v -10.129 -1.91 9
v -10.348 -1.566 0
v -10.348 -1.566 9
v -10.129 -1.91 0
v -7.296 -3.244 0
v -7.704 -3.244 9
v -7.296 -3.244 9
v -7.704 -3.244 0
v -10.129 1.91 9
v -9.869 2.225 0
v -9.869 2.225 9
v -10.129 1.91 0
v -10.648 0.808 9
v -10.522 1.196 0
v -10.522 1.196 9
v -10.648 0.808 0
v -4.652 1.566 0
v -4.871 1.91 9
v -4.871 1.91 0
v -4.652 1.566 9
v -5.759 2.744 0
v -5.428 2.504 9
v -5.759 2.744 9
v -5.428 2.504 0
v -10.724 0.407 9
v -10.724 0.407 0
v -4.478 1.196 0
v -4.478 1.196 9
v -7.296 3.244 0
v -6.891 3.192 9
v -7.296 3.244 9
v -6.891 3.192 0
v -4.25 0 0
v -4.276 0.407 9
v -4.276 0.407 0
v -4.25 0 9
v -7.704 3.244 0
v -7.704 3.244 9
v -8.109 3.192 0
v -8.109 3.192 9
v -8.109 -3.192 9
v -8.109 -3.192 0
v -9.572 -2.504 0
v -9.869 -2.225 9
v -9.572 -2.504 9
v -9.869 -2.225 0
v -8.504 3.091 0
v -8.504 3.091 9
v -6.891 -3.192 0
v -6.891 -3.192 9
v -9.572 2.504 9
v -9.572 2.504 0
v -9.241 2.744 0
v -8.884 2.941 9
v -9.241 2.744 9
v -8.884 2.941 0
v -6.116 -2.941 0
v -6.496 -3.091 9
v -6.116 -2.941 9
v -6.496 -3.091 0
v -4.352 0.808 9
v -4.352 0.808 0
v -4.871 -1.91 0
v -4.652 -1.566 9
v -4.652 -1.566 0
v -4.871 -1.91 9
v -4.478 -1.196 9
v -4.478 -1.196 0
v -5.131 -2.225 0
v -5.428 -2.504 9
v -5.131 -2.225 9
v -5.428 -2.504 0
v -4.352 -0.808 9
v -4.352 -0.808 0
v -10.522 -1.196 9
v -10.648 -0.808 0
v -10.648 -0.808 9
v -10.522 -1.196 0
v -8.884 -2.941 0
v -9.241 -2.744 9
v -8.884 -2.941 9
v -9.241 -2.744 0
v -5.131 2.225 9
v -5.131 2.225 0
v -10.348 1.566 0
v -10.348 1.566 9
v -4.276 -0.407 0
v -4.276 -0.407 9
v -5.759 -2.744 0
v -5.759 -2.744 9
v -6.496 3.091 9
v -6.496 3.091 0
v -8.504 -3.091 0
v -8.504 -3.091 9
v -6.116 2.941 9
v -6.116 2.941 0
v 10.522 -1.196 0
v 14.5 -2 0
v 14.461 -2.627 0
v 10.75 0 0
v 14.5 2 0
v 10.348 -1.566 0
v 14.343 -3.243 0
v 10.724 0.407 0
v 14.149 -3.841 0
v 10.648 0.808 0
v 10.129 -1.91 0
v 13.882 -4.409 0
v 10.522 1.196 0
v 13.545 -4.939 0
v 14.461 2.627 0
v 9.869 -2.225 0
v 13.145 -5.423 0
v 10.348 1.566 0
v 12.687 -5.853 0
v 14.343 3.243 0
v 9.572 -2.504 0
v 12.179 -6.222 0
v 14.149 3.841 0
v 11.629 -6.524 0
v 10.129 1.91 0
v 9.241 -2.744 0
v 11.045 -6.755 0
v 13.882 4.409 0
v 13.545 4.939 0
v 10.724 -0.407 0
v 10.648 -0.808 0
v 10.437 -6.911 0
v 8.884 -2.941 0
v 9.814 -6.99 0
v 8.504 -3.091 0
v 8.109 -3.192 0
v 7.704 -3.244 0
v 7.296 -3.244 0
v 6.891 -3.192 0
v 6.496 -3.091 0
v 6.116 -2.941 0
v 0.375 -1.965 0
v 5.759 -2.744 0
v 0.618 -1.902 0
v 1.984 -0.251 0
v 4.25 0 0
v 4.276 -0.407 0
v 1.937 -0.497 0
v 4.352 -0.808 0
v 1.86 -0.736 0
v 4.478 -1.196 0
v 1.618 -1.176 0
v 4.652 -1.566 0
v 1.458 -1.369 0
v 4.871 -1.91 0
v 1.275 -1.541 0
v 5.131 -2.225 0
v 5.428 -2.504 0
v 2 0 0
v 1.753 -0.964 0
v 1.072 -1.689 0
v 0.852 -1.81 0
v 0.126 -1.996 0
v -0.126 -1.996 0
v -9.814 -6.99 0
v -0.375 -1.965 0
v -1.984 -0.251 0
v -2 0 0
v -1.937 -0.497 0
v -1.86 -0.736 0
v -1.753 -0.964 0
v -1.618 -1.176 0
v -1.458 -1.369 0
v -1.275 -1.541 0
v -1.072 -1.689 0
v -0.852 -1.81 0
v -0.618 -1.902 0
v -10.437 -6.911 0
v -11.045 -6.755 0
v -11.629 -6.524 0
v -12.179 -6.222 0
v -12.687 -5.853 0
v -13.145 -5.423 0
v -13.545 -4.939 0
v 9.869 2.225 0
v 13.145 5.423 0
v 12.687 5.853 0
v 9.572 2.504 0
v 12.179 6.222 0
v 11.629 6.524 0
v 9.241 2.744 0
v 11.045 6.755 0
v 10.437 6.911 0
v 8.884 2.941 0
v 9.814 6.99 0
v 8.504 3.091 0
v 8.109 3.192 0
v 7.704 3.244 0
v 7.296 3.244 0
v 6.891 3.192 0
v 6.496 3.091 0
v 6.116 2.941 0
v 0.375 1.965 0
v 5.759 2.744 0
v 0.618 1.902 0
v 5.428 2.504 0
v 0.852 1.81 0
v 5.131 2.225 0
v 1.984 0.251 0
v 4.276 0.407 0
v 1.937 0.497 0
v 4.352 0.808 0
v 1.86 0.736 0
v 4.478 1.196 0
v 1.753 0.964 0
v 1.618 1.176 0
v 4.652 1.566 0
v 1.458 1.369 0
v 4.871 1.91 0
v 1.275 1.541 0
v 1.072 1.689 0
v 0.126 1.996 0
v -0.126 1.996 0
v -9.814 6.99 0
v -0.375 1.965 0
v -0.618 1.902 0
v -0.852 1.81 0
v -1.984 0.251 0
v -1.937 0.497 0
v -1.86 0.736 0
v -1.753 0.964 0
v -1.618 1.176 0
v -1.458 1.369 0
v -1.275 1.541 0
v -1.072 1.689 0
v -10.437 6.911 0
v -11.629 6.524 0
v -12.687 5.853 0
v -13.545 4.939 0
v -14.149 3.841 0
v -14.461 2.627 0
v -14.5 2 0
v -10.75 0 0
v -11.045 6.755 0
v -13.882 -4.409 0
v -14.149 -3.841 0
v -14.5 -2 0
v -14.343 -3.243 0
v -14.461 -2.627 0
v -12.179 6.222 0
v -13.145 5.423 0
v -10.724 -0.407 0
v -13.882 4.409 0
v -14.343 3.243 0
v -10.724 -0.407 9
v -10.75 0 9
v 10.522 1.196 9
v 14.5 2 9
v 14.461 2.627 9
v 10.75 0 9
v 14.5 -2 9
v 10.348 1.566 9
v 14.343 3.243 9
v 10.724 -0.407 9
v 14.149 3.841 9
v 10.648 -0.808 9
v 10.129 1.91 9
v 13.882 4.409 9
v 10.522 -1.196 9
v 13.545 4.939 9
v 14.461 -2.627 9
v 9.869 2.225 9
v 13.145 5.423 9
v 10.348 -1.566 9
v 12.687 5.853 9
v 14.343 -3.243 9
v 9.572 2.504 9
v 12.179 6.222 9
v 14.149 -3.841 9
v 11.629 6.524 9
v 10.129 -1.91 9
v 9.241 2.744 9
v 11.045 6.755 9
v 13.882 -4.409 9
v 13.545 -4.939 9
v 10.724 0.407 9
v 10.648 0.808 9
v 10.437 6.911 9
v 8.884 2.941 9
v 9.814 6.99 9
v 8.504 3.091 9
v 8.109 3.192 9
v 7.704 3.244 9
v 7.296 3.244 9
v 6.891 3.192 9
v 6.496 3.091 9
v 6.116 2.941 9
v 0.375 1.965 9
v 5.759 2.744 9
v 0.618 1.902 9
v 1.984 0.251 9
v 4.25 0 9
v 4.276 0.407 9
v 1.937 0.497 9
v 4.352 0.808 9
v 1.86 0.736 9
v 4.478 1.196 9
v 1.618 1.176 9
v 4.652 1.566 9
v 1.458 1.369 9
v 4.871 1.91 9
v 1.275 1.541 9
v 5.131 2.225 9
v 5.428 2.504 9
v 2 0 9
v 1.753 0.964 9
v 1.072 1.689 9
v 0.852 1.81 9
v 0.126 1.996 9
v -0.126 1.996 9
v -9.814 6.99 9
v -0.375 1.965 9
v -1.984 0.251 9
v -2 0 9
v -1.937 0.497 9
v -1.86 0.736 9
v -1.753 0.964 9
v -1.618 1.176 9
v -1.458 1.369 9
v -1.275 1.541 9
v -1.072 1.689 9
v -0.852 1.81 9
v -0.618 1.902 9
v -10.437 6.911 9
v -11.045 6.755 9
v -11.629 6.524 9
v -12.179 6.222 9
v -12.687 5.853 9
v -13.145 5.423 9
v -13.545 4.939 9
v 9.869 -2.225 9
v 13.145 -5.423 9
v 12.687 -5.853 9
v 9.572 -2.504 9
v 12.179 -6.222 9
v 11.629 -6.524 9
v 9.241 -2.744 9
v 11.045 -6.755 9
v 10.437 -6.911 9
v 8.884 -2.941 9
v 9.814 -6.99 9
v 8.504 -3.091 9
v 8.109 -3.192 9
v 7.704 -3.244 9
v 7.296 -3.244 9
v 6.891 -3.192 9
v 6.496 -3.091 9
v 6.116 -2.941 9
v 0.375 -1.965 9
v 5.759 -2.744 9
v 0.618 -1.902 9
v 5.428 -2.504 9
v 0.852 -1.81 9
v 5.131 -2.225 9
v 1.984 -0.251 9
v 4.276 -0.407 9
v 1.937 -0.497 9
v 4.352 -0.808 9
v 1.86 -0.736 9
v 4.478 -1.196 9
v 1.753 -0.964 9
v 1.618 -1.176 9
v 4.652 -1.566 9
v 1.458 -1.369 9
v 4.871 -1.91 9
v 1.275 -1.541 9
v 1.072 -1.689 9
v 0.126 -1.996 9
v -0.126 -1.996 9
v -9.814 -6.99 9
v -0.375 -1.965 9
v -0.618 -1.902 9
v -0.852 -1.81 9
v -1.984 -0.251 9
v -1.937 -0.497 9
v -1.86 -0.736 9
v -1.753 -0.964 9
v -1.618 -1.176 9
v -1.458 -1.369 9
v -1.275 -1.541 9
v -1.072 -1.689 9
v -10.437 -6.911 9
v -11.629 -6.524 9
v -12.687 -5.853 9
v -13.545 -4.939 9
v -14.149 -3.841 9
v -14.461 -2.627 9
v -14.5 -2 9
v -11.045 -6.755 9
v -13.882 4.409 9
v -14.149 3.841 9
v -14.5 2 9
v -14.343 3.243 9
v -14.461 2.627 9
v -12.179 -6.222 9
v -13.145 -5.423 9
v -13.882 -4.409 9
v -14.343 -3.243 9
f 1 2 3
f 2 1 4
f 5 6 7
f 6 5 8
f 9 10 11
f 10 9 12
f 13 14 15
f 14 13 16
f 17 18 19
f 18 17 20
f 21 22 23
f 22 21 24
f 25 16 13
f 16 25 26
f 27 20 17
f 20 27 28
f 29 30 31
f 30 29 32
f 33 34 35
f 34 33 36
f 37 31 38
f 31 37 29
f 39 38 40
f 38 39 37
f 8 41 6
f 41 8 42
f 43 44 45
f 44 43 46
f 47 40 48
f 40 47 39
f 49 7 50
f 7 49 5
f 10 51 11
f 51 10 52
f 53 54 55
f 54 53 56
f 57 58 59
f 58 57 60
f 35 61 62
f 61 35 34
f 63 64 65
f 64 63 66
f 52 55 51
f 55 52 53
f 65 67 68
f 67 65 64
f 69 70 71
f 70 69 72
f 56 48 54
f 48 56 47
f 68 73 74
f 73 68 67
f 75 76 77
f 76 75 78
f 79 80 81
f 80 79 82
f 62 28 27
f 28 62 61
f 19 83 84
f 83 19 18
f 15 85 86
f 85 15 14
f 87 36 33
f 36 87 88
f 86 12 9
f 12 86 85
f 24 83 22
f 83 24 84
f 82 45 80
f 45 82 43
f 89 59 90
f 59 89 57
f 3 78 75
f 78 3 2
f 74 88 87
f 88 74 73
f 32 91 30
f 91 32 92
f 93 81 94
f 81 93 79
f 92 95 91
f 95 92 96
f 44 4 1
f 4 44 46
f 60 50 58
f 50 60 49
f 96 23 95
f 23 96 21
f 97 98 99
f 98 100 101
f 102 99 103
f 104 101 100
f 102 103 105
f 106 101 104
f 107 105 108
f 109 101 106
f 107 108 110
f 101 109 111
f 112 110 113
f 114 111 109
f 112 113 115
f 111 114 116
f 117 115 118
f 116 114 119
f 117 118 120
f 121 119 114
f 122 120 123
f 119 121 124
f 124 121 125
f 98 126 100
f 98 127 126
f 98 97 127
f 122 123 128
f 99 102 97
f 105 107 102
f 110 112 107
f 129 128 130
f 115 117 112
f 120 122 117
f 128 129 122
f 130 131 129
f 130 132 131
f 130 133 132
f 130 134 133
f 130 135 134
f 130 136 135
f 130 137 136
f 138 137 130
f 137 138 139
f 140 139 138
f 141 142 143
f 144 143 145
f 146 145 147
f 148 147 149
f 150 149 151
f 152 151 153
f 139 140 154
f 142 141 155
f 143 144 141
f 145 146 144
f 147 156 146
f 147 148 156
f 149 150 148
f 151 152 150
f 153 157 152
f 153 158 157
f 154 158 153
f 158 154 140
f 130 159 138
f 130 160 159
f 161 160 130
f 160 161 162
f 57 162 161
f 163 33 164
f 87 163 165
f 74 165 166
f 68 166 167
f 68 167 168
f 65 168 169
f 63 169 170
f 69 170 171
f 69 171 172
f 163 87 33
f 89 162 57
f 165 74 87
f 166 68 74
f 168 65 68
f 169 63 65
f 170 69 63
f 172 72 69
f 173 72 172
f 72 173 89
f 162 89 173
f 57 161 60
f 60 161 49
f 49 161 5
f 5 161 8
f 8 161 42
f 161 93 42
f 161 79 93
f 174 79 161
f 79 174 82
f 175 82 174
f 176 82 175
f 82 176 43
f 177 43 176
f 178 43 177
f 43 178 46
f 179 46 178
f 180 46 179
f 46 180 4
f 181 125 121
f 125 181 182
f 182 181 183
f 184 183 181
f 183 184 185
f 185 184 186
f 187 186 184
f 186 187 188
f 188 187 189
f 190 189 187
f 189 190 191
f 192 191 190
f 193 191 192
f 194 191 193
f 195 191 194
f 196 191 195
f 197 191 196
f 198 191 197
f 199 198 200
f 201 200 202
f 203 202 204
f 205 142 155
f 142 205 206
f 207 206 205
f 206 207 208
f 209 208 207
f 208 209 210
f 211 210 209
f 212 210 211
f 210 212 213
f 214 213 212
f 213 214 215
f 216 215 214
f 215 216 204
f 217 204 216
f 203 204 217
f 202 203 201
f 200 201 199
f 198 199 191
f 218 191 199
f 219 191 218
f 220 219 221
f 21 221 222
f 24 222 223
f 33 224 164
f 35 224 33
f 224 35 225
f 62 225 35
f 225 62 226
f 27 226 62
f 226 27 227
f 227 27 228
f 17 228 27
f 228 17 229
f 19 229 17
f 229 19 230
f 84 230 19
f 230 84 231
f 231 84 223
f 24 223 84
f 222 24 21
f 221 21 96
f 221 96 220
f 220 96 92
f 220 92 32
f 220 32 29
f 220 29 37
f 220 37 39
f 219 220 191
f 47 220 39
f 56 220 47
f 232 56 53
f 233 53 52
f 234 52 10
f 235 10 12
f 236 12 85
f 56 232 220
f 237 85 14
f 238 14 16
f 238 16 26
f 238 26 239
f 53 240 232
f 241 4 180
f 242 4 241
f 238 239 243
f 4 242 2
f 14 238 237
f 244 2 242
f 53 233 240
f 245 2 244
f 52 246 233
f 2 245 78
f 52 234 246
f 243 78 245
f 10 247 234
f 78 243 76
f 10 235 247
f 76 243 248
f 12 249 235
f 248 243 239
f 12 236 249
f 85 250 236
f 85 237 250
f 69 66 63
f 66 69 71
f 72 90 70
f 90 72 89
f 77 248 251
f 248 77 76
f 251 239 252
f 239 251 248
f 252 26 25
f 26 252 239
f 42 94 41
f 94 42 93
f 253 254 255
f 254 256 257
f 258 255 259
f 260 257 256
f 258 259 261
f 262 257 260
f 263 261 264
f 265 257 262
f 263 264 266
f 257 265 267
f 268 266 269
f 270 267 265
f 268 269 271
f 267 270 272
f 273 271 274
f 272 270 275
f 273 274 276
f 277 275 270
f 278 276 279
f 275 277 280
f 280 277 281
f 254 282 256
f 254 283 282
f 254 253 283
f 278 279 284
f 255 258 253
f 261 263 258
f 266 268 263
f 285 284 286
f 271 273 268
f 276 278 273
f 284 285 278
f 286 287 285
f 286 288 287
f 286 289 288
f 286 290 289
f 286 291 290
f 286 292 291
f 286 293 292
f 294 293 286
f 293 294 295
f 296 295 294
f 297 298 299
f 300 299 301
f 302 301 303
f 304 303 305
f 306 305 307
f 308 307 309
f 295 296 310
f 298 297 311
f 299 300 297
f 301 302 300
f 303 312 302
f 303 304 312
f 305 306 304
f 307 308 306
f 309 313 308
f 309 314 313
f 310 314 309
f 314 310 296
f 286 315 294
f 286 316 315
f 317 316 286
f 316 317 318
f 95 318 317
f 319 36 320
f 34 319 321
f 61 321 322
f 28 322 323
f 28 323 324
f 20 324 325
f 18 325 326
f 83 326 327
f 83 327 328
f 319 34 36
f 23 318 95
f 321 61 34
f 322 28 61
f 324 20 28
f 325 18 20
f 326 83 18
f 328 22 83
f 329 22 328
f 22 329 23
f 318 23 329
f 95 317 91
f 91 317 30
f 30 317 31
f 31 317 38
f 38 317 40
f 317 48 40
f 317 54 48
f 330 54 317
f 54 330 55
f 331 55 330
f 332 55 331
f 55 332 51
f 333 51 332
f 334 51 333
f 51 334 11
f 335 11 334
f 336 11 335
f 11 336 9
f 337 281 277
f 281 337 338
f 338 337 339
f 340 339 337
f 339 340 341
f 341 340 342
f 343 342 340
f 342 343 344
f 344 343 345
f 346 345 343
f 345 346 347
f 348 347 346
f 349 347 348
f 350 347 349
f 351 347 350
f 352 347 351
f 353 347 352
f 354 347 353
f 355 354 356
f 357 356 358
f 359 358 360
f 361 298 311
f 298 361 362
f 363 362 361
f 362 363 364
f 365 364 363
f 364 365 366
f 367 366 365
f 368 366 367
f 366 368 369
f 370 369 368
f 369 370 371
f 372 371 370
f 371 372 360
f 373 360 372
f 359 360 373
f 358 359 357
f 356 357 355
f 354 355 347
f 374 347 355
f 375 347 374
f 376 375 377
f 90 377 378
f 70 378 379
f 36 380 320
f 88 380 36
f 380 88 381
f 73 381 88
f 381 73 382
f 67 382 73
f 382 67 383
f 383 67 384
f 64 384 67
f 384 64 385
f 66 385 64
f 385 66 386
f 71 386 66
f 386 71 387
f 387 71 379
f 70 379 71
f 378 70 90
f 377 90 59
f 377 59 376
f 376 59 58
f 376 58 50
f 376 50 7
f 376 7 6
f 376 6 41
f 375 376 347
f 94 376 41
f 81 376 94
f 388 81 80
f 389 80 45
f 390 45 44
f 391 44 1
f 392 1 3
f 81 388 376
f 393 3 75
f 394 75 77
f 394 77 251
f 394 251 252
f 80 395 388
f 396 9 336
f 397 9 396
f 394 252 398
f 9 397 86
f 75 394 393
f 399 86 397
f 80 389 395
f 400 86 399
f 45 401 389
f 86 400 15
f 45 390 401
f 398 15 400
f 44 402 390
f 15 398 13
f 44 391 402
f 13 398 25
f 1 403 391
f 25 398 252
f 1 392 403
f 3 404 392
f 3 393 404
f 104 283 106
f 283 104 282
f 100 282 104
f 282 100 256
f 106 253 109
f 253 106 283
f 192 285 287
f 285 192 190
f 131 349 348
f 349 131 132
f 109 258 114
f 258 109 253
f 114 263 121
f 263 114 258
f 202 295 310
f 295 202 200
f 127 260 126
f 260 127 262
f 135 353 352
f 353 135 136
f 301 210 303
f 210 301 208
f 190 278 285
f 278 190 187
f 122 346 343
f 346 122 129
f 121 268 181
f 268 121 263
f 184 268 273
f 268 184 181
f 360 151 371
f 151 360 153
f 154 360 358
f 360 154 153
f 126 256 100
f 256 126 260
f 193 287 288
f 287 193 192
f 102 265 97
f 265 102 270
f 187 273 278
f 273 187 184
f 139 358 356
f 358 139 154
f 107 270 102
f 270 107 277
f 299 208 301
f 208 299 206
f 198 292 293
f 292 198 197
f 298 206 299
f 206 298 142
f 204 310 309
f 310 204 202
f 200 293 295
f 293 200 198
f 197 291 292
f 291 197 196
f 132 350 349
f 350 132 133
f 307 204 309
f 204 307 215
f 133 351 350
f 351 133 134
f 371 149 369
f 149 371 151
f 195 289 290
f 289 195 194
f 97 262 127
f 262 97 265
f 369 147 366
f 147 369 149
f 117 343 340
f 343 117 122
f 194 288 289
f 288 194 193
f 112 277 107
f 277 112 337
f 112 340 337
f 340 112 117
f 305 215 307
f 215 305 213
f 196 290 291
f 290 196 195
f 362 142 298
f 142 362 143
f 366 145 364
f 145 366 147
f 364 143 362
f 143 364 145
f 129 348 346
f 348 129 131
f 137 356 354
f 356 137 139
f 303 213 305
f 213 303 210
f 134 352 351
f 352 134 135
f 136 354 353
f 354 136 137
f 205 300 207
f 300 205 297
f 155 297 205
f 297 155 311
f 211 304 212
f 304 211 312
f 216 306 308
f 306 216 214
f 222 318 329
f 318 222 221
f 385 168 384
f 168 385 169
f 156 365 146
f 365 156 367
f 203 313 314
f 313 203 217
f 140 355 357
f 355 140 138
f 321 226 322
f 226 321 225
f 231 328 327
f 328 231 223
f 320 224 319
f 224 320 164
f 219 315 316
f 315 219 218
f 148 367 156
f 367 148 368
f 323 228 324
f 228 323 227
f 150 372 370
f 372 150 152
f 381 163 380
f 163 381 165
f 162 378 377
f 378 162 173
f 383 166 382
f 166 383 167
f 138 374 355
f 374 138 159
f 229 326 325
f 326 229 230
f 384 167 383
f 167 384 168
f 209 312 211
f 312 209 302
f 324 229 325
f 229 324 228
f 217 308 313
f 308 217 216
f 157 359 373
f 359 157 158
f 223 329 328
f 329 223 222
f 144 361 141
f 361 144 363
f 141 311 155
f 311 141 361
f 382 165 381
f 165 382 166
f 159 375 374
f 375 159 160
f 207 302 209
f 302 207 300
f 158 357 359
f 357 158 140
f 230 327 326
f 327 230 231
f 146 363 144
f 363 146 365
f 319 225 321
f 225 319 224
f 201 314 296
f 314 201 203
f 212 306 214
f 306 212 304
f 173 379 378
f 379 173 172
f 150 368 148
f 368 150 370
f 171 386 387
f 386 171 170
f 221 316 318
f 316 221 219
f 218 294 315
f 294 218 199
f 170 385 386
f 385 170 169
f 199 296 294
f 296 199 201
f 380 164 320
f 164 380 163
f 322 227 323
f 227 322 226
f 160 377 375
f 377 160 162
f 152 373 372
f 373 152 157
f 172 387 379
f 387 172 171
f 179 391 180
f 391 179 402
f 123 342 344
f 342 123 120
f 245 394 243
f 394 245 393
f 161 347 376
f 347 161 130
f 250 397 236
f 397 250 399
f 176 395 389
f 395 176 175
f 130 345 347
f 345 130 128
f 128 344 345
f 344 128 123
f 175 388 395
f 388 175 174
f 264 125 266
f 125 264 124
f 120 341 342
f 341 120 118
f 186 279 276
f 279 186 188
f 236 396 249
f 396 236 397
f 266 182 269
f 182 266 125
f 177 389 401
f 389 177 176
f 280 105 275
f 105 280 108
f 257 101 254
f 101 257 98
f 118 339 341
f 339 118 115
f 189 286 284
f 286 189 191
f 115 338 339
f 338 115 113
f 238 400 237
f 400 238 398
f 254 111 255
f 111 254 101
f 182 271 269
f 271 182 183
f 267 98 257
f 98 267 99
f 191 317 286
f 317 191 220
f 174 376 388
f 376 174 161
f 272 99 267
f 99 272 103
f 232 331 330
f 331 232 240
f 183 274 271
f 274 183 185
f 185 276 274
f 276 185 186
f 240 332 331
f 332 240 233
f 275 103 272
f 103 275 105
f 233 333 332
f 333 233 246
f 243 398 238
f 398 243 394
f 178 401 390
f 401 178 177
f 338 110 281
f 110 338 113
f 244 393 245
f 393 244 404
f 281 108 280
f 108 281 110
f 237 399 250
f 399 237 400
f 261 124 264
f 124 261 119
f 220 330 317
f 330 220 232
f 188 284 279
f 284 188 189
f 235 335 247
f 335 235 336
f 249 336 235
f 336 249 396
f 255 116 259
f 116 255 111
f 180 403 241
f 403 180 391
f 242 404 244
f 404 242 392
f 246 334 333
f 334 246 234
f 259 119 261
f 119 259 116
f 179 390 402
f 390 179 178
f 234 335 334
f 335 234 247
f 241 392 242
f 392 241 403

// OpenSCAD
$fn = 50;

difference() {
	union() {
		hull() {
			translate(v = [-9.5, 2.0, 0]) {
				cylinder(h = 9, r = 5);
			}
			translate(v = [9.5, 2.0, 0]) {
				cylinder(h = 9, r = 5);
			}
			translate(v = [-9.5, -2.0, 0]) {
				cylinder(h = 9, r = 5);
			}
			translate(v = [9.5, -2.0, 0]) {
				cylinder(h = 9, r = 5);
			}
		}
	}
	union() {
		translate(v = [-7.5, 0.0, 0]) {
			cylinder(h = 9, r = 3.25);
		}
		translate(v = [7.5, 0.0, 0]) {
			cylinder(h = 9, r = 3.25);
		}
		cylinder(h = 9, r = 2.0);
	}
}
